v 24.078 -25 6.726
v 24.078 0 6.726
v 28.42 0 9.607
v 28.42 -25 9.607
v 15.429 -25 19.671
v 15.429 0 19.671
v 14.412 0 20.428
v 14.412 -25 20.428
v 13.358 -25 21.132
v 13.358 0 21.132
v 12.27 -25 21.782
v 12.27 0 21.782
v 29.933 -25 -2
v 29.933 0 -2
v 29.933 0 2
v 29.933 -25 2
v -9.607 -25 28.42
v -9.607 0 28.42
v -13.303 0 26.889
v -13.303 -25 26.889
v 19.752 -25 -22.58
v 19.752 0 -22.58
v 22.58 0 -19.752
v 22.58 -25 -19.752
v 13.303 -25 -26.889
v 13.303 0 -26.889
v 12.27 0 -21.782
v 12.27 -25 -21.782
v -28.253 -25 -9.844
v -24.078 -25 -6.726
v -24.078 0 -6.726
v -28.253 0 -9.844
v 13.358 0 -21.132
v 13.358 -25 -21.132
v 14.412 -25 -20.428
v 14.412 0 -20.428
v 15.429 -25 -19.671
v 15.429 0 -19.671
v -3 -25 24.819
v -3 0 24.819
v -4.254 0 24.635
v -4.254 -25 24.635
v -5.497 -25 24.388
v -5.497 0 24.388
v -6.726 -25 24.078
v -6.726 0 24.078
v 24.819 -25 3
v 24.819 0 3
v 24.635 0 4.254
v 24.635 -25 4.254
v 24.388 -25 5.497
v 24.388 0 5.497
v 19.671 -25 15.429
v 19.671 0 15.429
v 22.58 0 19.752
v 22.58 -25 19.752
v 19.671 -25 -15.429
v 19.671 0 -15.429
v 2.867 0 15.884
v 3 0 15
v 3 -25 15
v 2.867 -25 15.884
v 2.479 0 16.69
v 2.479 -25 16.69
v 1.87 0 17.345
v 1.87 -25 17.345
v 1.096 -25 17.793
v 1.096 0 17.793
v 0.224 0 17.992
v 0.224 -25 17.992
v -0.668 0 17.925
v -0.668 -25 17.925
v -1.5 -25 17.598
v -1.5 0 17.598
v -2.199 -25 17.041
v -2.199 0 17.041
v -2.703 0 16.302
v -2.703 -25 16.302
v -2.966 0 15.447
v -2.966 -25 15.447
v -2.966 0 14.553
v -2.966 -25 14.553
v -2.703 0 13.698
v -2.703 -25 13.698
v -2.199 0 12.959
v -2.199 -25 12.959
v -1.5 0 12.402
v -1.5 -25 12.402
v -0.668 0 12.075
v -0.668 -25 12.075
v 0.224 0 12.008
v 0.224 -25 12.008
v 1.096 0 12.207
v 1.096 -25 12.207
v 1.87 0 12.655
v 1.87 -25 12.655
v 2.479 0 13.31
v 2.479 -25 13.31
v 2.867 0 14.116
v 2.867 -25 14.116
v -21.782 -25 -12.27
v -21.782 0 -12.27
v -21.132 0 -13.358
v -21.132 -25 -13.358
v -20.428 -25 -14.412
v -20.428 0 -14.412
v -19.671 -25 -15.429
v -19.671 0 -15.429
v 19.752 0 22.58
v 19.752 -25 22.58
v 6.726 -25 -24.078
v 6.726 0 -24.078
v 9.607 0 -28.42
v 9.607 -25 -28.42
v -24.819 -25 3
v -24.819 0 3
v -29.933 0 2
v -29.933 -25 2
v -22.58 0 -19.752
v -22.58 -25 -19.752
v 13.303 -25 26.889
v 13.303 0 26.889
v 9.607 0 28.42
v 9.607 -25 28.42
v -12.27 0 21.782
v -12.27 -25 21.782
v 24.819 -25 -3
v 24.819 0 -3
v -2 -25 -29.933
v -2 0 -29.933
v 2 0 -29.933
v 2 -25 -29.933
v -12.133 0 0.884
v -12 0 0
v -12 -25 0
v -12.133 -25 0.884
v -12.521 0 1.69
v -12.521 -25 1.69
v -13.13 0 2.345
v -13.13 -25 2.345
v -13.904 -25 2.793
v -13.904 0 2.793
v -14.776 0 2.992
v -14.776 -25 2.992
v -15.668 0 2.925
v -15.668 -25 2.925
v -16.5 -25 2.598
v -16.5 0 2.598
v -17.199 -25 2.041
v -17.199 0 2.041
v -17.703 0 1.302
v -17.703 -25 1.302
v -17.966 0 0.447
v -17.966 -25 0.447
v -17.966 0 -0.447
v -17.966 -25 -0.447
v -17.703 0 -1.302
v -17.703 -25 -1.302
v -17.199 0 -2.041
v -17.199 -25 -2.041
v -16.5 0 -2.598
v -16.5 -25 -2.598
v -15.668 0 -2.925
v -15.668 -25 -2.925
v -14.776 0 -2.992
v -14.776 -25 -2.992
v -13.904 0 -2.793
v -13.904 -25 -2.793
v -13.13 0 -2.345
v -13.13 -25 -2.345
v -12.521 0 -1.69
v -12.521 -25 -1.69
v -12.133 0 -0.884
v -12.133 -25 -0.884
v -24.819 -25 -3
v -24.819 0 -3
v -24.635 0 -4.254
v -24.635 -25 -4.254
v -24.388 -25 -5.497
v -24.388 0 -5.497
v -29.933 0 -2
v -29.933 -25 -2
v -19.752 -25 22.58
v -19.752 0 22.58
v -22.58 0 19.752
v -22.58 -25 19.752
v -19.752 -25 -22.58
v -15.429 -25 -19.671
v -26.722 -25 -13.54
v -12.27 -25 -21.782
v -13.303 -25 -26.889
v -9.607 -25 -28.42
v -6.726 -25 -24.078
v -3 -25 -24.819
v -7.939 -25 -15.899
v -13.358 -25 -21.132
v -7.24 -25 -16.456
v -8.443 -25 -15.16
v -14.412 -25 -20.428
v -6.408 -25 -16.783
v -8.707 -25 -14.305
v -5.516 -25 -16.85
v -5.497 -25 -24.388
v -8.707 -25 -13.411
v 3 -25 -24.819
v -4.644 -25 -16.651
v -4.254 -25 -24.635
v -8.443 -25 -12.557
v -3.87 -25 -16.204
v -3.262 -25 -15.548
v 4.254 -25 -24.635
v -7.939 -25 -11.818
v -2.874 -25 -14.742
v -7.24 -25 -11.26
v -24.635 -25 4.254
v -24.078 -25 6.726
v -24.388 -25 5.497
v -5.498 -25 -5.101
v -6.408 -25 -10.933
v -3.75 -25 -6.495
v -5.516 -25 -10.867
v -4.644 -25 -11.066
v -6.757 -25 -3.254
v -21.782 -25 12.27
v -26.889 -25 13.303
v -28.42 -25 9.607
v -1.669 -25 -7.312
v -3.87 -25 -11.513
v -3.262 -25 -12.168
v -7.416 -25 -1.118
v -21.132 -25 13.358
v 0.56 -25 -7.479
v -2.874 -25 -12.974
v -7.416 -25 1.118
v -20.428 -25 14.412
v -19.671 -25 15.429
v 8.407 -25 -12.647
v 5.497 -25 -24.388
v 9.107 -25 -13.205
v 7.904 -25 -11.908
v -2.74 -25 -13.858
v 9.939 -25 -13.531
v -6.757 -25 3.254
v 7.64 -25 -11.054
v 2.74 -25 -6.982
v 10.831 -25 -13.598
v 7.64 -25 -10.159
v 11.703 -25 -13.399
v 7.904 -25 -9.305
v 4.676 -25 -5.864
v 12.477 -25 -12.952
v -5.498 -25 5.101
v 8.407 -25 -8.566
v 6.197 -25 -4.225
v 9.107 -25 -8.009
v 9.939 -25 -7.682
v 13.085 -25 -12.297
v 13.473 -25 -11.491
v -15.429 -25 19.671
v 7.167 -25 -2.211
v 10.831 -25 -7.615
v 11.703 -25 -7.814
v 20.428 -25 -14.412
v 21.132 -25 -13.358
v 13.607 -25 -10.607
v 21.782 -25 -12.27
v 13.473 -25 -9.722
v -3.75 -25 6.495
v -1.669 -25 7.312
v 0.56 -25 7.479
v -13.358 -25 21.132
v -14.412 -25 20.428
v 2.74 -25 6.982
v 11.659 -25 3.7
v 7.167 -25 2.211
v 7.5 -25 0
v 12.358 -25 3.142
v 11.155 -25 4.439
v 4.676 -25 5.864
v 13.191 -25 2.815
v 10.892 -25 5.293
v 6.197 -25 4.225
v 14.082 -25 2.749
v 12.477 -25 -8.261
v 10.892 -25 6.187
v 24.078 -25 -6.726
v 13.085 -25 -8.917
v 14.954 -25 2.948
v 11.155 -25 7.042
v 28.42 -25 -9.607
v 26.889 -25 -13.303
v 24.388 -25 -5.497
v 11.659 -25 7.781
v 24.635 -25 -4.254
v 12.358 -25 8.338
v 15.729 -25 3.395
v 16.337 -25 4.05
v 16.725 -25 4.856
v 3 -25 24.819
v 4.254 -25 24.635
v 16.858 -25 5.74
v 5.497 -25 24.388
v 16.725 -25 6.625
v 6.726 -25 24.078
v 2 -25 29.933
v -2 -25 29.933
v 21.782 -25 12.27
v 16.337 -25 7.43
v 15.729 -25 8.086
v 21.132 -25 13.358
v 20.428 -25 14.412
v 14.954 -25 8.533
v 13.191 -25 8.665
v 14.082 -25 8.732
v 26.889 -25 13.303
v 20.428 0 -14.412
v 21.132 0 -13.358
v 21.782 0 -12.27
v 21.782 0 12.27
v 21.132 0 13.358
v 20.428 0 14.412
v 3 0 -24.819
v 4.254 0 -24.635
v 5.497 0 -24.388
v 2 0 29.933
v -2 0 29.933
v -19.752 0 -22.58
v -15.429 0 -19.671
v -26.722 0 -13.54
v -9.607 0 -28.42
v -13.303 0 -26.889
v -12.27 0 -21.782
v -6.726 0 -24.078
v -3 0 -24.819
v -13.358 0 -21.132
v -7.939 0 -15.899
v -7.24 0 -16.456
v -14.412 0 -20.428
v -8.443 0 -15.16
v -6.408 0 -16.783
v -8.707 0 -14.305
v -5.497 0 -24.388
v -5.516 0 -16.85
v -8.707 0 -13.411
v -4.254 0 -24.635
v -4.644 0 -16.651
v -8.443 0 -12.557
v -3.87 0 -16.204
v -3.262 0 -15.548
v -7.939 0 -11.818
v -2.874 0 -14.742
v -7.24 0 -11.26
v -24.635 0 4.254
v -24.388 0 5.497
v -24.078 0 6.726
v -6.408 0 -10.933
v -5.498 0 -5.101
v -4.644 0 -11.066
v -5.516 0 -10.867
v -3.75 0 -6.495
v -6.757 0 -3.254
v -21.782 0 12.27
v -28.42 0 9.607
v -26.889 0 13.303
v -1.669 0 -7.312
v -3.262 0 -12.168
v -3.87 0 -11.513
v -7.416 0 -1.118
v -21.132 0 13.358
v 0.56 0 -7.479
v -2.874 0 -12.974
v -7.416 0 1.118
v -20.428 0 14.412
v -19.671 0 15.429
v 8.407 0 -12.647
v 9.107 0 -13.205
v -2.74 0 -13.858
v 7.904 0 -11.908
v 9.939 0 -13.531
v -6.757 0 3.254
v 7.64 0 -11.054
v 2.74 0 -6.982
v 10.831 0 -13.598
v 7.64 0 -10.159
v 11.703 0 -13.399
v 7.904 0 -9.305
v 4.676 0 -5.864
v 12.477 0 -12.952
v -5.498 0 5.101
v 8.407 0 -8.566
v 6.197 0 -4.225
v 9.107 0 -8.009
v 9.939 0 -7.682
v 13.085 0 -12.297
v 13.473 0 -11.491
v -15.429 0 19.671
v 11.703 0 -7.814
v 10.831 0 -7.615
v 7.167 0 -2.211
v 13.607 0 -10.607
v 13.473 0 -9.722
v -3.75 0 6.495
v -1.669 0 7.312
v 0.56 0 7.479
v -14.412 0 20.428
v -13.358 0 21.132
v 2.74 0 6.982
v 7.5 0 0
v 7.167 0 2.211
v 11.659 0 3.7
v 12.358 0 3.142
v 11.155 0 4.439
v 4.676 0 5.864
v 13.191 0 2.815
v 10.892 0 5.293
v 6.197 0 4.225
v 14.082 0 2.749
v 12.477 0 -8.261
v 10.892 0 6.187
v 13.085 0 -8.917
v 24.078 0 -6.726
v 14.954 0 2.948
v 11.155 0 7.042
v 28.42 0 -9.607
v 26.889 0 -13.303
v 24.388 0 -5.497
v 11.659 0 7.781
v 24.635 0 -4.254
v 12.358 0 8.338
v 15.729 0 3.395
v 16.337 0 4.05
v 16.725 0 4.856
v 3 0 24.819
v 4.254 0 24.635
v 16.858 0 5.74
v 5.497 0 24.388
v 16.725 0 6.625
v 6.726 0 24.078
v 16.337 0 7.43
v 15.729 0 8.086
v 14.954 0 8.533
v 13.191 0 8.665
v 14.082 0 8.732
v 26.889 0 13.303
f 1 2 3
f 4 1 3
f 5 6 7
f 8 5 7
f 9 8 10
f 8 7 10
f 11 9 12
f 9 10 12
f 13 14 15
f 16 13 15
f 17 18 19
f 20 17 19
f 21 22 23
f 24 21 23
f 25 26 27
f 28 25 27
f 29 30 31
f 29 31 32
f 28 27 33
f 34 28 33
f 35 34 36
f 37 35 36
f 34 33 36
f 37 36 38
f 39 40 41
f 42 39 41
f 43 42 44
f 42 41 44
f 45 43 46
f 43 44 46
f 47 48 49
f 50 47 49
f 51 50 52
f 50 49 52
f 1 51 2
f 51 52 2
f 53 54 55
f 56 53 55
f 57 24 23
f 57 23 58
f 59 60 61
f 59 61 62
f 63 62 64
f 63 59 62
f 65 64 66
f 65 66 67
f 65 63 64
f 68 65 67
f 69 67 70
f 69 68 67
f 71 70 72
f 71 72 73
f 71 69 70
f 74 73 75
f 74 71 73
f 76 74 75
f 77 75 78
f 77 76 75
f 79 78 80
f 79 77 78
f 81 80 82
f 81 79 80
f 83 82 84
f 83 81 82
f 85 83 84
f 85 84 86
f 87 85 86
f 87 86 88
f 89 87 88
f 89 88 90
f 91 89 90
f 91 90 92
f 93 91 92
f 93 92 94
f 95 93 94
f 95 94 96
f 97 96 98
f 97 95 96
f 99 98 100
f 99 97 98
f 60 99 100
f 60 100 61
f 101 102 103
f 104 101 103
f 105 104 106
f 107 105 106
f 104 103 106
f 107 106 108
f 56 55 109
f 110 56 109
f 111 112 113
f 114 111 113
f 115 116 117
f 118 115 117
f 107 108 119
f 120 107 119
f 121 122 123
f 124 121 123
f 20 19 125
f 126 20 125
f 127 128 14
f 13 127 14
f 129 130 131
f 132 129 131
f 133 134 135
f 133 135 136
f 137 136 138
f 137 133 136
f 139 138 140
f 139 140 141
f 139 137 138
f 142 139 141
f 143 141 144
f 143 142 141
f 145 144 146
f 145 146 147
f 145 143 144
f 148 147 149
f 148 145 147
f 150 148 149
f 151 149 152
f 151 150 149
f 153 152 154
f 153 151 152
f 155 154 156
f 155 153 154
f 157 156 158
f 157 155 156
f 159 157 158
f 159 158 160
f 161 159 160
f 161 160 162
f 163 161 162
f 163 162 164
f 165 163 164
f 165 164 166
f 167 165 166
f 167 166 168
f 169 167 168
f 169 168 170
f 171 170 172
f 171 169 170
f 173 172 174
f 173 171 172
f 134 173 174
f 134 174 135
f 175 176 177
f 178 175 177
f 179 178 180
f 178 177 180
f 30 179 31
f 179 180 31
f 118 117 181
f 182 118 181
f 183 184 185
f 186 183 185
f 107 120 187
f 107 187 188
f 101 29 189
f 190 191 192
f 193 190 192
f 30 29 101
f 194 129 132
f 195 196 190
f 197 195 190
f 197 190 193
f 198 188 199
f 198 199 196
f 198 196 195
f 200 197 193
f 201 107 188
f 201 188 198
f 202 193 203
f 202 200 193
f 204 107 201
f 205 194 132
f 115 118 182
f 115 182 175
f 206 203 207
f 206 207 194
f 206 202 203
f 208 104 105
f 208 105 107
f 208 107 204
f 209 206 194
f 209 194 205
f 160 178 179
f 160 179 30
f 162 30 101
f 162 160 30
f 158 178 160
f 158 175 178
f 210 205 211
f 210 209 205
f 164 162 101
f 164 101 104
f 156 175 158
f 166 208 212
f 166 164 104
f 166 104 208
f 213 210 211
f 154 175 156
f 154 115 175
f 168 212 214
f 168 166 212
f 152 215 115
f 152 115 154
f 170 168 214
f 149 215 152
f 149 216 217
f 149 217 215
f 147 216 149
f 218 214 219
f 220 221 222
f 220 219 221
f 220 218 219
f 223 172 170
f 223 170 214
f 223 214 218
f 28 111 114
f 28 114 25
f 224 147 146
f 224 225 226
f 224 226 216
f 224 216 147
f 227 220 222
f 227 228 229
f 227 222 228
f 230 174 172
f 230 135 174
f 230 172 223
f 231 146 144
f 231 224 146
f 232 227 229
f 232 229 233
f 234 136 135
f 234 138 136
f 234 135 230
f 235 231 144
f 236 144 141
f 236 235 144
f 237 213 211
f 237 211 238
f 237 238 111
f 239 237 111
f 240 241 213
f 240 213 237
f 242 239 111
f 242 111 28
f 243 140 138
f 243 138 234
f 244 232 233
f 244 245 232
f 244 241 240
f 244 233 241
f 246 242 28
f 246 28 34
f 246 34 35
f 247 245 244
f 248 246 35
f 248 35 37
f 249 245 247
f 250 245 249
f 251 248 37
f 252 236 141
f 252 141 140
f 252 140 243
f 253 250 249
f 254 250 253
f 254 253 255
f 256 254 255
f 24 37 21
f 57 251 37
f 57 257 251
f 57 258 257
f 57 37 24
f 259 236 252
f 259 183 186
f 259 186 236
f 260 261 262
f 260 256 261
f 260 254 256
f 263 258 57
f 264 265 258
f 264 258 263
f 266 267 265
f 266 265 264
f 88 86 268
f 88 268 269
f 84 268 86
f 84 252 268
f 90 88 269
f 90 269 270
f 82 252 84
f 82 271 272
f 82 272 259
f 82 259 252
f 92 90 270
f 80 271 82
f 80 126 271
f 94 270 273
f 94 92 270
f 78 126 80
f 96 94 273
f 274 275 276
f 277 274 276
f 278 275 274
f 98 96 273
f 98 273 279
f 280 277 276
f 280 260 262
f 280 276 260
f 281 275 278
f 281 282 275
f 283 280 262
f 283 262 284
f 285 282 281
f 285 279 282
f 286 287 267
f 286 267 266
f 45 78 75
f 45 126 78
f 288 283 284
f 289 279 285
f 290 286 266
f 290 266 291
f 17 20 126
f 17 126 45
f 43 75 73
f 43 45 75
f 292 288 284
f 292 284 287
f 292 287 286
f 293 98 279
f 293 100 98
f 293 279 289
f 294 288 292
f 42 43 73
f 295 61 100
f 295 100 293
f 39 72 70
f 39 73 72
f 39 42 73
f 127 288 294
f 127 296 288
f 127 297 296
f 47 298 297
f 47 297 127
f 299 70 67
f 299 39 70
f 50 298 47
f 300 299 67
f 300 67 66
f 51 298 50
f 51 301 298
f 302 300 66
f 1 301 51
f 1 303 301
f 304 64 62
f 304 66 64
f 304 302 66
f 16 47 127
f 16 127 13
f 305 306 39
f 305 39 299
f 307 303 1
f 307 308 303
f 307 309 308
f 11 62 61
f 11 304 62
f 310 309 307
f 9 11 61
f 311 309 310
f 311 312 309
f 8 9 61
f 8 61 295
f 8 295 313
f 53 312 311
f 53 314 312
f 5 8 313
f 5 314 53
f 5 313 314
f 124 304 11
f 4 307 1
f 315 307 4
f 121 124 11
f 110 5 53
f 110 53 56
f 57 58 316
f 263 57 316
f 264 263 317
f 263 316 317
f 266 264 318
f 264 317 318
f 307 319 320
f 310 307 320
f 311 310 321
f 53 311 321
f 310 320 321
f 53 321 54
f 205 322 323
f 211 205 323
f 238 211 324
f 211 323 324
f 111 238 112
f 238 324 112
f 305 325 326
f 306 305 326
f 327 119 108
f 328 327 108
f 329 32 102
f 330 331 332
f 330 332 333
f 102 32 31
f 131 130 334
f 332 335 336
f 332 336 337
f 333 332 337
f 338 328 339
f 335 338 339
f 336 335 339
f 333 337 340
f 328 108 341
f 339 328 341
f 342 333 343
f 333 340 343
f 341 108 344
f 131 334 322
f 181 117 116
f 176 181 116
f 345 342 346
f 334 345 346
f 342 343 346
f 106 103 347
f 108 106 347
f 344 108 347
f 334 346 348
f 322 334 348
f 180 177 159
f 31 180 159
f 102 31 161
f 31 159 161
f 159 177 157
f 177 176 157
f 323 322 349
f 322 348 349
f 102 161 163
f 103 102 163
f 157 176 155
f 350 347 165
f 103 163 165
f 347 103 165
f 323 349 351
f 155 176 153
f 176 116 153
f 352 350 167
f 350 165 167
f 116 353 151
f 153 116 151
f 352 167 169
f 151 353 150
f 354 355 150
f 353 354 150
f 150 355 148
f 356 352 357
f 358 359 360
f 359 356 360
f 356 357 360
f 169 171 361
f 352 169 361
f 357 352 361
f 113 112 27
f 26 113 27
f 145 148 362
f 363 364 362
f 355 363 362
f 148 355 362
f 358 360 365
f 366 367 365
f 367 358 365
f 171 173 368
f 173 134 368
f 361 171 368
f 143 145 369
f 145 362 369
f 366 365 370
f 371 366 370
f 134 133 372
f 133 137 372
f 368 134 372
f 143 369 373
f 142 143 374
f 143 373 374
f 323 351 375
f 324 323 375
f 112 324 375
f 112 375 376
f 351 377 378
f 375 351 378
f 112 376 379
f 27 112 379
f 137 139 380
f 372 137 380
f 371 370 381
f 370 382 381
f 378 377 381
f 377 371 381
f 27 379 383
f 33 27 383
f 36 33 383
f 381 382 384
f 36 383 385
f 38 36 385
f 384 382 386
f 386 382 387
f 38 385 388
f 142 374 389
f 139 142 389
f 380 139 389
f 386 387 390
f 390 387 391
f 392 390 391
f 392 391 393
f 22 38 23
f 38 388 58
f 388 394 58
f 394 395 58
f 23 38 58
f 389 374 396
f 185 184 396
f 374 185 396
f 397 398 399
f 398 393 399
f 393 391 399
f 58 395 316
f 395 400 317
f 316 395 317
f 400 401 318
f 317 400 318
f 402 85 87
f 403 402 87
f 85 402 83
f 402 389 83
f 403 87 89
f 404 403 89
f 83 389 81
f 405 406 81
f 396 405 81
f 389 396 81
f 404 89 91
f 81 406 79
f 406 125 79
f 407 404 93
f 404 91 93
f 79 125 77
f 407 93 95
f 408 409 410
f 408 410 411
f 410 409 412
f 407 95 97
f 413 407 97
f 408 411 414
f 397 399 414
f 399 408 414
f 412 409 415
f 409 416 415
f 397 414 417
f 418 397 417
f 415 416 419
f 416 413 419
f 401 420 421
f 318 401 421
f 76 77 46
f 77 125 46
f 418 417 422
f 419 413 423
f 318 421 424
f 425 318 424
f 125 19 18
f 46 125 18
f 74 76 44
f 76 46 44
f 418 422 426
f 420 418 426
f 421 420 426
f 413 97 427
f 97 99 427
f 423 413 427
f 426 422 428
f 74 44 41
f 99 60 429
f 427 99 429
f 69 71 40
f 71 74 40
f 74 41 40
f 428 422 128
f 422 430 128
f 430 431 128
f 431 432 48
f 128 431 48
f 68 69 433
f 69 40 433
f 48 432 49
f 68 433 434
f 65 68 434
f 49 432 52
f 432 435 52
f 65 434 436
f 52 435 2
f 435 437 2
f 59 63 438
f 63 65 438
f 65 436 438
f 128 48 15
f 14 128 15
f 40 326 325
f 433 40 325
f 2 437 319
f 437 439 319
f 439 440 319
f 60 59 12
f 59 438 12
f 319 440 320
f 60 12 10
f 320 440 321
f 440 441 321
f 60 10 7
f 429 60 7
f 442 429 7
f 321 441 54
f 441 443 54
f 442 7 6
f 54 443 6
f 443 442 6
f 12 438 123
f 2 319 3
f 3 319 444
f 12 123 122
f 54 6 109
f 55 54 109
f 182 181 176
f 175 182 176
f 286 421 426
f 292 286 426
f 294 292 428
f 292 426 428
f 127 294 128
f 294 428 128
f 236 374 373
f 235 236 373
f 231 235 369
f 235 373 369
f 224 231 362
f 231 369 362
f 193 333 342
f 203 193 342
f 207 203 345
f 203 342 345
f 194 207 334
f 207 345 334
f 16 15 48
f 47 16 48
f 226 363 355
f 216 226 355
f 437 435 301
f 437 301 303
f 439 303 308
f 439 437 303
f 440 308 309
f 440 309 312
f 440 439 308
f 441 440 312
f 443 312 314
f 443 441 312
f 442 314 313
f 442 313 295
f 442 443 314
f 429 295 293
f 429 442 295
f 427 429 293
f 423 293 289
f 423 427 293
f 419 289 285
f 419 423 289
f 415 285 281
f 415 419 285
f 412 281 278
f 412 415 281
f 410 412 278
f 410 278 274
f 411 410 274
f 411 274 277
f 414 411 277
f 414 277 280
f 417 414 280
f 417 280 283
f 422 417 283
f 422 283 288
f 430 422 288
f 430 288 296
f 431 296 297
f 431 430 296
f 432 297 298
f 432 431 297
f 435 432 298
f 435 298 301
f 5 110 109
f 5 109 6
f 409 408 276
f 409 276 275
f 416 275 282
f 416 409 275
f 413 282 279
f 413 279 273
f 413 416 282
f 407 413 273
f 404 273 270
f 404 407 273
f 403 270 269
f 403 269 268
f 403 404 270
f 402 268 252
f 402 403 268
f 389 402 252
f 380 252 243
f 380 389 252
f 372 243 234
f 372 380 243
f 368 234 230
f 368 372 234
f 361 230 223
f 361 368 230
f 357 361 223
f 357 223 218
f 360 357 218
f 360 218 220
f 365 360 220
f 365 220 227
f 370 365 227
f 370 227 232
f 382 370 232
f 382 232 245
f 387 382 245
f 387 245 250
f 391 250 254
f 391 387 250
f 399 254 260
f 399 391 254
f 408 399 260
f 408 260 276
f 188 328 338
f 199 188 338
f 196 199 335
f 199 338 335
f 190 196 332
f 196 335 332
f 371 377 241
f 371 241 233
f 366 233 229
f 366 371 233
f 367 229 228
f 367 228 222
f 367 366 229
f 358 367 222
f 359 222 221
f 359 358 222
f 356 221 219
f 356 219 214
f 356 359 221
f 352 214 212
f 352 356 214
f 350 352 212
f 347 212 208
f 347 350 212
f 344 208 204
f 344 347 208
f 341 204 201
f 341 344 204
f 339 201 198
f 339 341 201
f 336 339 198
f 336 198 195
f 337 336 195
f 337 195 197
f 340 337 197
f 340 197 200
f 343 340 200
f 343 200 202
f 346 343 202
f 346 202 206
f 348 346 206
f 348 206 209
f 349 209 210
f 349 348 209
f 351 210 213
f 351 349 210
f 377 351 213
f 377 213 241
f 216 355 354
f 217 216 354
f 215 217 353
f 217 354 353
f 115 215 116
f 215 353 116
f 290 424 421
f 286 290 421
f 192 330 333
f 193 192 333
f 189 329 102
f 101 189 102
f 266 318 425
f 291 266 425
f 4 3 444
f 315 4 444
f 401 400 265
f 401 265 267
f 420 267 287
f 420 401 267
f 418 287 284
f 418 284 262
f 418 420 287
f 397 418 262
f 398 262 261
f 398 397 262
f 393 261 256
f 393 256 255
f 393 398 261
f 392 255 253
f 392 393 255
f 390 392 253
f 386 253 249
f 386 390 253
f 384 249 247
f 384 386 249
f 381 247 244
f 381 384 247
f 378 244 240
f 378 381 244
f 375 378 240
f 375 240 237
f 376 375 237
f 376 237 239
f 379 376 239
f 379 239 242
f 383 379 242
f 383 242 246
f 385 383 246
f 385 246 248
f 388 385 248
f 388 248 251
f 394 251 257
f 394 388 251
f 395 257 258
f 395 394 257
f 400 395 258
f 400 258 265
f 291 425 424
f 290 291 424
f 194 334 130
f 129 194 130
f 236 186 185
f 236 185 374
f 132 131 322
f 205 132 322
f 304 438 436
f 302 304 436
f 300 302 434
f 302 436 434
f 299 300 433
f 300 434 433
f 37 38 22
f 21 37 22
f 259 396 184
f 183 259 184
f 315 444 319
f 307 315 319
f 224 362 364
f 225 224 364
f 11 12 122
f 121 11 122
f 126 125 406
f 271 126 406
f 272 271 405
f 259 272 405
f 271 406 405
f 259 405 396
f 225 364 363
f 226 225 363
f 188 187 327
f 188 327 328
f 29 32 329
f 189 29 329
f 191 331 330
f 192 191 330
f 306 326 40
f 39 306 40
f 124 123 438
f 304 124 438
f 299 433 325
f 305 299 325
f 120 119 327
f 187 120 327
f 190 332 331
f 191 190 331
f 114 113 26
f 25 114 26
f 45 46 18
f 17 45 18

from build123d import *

# Parameters (mm, degrees)
F0_R     = 3
F0_R_2   = 7.5
F1_DEPTH = 25


with BuildPart() as f1:
    # F0 (on Front) → F1 (new body)
    with BuildSketch(Plane.XZ):
        with BuildLine():
            Line((9.607203, 28.420092), (6.726314, 24.078137))
            ThreePointArc((6.726314, 24.078137), (4.877258, 24.519632), (3, 24.819347))
            Line((3, 24.819347), (2, 29.933259))
            Line((2, 29.933259), (-2, 29.933259))
            Line((-2, 29.933259), (-3, 24.819347))
            ThreePointArc((-3, 24.819347), (-4.877258, 24.519632), (-6.726314, 24.078137))
            Line((-6.726314, 24.078137), (-9.607203, 28.420092))
            Line((-9.607203, 28.420092), (-13.302721, 26.889359))
            Line((-13.302721, 26.889359), (-12.269592, 21.782037))
            ThreePointArc((-12.269592, 21.782037), (-13.889256, 20.78674), (-15.428608, 19.671249))
            Line((-15.428608, 19.671249), (-19.751797, 22.580224))
            Line((-19.751797, 22.580224), (-22.580224, 19.751797))
            Line((-22.580224, 19.751797), (-19.671249, 15.428608))
            ThreePointArc((-19.671249, 15.428608), (-20.78674, 13.889256), (-21.782037, 12.269592))
            Line((-21.782037, 12.269592), (-26.889359, 13.302721))
            Line((-26.889359, 13.302721), (-28.420092, 9.607203))
            Line((-28.420092, 9.607203), (-24.078137, 6.726314))
            ThreePointArc((-24.078137, 6.726314), (-24.519632, 4.877258), (-24.819347, 3))
            Line((-24.819347, 3), (-29.933259, 2))
            Line((-29.933259, 2), (-29.933259, -2))
            Line((-29.933259, -2), (-24.819347, -3))
            ThreePointArc((-24.819347, -3), (-24.519632, -4.877258), (-24.078137, -6.726314))
            Line((-24.078137, -6.726314), (-28.253115, -9.844271))
            Line((-28.253115, -9.844271), (-26.722382, -13.539789))
            Line((-26.722382, -13.539789), (-21.782037, -12.269592))
            ThreePointArc((-21.782037, -12.269592), (-20.78674, -13.889256), (-19.671249, -15.428608))
            Line((-19.671249, -15.428608), (-22.580224, -19.751797))
            Line((-22.580224, -19.751797), (-19.751797, -22.580224))
            Line((-19.751797, -22.580224), (-15.428608, -19.671249))
            ThreePointArc((-15.428608, -19.671249), (-13.889256, -20.78674), (-12.269592, -21.782037))
            Line((-12.269592, -21.782037), (-13.302721, -26.889359))
            Line((-13.302721, -26.889359), (-9.607203, -28.420092))
            Line((-9.607203, -28.420092), (-6.726314, -24.078137))
            ThreePointArc((-6.726314, -24.078137), (-4.877258, -24.519632), (-3, -24.819347))
            Line((-3, -24.819347), (-2, -29.933259))
            Line((-2, -29.933259), (2, -29.933259))
            Line((2, -29.933259), (3, -24.819347))
            ThreePointArc((3, -24.819347), (4.877258, -24.519632), (6.726314, -24.078137))
            Line((6.726314, -24.078137), (9.607203, -28.420092))
            Line((9.607203, -28.420092), (13.302721, -26.889359))
            Line((13.302721, -26.889359), (12.269592, -21.782037))
            ThreePointArc((12.269592, -21.782037), (13.889256, -20.78674), (15.428608, -19.671249))
            Line((15.428608, -19.671249), (19.751797, -22.580224))
            Line((19.751797, -22.580224), (22.580224, -19.751797))
            Line((22.580224, -19.751797), (19.671249, -15.428608))
            ThreePointArc((19.671249, -15.428608), (20.78674, -13.889256), (21.782037, -12.269592))
            Line((21.782037, -12.269592), (26.889359, -13.302721))
            Line((26.889359, -13.302721), (28.420092, -9.607203))
            Line((28.420092, -9.607203), (24.078137, -6.726314))
            ThreePointArc((24.078137, -6.726314), (24.519632, -4.877258), (24.819347, -3))
            Line((24.819347, -3), (29.933259, -2))
            Line((29.933259, -2), (29.933259, 2))
            Line((29.933259, 2), (24.819347, 3))
            ThreePointArc((24.819347, 3), (24.519632, 4.877258), (24.078137, 6.726314))
            Line((24.078137, 6.726314), (28.420092, 9.607203))
            Line((28.420092, 9.607203), (26.889359, 13.302721))
            Line((26.889359, 13.302721), (21.782037, 12.269592))
            ThreePointArc((21.782037, 12.269592), (20.78674, 13.889256), (19.671249, 15.428608))
            Line((19.671249, 15.428608), (22.580224, 19.751797))
            Line((22.580224, 19.751797), (19.751797, 22.580224))
            Line((19.751797, 22.580224), (15.428608, 19.671249))
            ThreePointArc((15.428608, 19.671249), (13.889256, 20.78674), (12.269592, 21.782037))
            Line((12.269592, 21.782037), (13.302721, 26.889359))
            Line((13.302721, 26.889359), (9.607203, 28.420092))
        make_face()
        with Locations((-15, 0)):
            Circle(F0_R, mode=Mode.SUBTRACT)
        with Locations((-5.740251, -13.858193)):
            Circle(F0_R, mode=Mode.SUBTRACT)
        Circle(F0_R_2, mode=Mode.SUBTRACT)
        with Locations((10.606602, -10.606602)):
            Circle(F0_R, mode=Mode.SUBTRACT)
        with Locations((0, 15)):
            Circle(F0_R, mode=Mode.SUBTRACT)
        with Locations((13.858193, 5.740251)):
            Circle(F0_R, mode=Mode.SUBTRACT)
    extrude(amount=F1_DEPTH)


solid = f1.part
